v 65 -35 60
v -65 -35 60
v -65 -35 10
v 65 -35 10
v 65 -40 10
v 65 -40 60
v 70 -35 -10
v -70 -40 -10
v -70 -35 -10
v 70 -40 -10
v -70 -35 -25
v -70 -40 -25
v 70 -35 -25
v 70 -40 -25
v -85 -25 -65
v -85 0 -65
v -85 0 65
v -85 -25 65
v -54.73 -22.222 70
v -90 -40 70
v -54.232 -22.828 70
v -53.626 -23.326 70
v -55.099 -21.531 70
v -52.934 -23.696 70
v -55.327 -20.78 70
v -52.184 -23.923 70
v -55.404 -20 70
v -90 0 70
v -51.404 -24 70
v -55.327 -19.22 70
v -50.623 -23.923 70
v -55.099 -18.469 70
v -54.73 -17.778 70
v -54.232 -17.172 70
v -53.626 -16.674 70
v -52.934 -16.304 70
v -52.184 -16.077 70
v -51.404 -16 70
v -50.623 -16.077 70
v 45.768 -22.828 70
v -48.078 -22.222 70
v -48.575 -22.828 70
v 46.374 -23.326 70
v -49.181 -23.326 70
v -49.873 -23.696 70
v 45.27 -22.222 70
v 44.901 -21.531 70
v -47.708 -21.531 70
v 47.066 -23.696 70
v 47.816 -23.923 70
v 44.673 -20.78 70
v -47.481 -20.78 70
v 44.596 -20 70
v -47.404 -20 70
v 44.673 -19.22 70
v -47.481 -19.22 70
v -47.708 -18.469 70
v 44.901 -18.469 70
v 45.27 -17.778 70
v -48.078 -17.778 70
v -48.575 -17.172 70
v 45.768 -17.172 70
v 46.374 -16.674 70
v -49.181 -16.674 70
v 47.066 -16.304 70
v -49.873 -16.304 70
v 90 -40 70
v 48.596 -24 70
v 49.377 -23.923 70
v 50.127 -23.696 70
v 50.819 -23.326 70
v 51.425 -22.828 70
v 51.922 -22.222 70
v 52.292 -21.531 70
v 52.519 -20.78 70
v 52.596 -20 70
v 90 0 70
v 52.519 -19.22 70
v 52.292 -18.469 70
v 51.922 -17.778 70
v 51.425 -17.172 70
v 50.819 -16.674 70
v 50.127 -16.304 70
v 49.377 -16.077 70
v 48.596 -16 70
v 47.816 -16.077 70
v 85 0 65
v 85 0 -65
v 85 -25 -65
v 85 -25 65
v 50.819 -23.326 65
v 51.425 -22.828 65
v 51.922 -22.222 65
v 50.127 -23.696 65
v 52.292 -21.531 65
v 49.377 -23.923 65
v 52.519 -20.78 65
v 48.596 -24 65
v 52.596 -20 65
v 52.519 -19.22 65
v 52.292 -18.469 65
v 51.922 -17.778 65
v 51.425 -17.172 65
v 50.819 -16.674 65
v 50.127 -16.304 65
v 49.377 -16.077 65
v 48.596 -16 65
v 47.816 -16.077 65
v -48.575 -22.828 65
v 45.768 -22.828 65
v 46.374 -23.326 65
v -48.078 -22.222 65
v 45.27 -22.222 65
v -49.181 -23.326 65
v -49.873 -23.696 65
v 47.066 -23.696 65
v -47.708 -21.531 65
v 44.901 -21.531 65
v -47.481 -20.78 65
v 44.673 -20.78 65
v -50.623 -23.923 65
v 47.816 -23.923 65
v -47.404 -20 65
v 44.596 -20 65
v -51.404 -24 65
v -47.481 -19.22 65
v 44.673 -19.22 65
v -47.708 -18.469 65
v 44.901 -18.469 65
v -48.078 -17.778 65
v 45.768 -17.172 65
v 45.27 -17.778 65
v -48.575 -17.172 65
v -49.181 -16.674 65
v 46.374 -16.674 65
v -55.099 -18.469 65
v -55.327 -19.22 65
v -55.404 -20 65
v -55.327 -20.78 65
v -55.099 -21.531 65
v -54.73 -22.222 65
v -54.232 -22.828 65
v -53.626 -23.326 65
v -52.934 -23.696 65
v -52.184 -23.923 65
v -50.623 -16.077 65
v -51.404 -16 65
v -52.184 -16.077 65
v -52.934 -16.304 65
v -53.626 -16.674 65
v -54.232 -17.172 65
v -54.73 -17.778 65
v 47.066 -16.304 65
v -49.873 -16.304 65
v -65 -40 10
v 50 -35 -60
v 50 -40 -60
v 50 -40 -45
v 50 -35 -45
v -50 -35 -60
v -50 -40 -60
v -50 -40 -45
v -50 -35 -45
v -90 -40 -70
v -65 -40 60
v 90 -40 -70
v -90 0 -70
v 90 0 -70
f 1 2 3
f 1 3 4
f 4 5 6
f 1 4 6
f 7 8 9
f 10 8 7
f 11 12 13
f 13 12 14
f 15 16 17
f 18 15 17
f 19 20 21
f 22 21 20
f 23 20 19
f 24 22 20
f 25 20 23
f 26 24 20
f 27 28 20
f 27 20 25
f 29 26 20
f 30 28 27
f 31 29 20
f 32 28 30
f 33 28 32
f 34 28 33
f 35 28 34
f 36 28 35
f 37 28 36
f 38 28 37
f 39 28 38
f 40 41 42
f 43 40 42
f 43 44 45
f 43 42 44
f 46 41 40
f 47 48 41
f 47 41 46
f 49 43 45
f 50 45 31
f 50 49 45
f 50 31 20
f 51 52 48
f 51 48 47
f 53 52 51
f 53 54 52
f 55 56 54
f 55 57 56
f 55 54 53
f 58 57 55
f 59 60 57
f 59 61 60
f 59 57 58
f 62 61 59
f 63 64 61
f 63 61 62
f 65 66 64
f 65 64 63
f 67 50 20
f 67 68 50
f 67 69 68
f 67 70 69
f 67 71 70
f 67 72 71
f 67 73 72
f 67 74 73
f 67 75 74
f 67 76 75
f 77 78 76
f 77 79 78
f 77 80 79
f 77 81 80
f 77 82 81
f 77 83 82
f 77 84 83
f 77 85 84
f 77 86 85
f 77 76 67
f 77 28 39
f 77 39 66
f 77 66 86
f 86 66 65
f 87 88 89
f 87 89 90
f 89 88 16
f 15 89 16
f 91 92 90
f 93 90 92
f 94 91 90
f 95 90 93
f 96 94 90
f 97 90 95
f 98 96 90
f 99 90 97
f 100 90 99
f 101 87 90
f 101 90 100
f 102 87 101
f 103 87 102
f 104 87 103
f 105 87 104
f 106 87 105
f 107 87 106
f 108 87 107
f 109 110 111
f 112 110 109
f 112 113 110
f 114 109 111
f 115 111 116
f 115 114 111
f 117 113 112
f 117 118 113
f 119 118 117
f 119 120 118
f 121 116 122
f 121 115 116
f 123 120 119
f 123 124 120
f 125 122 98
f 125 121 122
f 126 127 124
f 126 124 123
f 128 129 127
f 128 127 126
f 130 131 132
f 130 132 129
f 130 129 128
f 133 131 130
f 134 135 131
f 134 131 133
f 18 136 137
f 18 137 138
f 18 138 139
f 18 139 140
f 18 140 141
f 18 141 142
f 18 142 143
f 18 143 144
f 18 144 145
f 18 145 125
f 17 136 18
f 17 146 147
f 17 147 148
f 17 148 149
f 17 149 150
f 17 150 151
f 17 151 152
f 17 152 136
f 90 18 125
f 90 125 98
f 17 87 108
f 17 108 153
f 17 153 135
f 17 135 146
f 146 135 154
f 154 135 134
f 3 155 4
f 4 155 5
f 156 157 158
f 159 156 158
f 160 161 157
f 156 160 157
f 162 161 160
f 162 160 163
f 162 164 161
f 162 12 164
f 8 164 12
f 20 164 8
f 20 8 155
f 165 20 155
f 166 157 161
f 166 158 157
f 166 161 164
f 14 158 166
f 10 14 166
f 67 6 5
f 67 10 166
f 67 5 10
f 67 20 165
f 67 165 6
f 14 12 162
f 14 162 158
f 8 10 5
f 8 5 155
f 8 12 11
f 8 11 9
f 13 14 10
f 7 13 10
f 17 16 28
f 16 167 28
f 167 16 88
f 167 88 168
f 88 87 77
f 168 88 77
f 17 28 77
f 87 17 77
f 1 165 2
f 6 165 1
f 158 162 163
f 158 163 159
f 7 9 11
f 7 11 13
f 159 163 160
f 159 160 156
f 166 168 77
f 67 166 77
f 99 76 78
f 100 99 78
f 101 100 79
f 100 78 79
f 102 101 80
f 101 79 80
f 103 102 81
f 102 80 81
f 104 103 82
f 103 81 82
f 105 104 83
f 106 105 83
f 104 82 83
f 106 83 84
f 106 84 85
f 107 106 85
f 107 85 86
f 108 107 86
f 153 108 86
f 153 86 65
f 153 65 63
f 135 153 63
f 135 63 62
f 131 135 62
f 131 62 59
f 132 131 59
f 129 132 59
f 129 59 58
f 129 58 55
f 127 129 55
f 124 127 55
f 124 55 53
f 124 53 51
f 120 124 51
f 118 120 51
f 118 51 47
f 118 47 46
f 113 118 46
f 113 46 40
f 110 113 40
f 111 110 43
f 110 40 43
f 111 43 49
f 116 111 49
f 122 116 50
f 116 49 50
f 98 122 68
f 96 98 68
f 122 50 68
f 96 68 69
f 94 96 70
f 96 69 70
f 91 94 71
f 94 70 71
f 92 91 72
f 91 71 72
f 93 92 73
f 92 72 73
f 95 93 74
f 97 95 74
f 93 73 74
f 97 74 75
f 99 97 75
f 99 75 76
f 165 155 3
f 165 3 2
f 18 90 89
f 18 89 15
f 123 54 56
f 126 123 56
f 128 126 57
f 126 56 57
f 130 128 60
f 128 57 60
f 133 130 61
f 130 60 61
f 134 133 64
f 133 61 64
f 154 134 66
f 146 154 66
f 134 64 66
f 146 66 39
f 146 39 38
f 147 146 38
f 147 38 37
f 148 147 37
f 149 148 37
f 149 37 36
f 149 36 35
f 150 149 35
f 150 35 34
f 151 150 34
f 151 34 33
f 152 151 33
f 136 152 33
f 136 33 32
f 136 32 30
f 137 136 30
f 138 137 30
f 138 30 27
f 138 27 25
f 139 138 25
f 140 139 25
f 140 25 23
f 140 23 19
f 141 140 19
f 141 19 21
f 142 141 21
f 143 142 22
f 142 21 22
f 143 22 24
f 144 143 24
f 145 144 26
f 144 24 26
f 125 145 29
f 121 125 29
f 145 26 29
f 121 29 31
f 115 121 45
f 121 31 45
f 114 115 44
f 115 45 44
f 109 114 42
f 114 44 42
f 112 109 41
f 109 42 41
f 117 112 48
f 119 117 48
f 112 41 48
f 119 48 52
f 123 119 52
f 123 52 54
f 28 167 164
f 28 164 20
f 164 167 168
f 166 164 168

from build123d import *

# Parameters (mm, degrees)
F0_W     = 180
F0_H     = 140
F1_DEPTH = 40
F2_W     = 130
F2_H     = 50
F2_W_2   = 140
F2_H_2   = 15
F2_W_3   = 100
F3_DEPTH = 5
F4_W     = 170
F4_H     = 130
F5_DEPTH = 25
F6_R     = 4
F7_DEPTH = 25


with BuildPart() as f1:
    # F0 (on Front) → F1 (new body)
    with BuildSketch(Plane.XZ):
        Rectangle(F0_W, F0_H)
    extrude(amount=F1_DEPTH)

    # F2 (on face) → F3 (cut)
    with BuildSketch(Plane.XZ.offset(40)):
        with Locations((0, 35)):
            Rectangle(F2_W, F2_H)
        with Locations((0, -17.5)):
            Rectangle(F2_W_2, F2_H_2)
        with Locations((0, -52.5)):
            Rectangle(F2_W_3, F2_H_2)
    extrude(amount=-F3_DEPTH, mode=Mode.SUBTRACT)

    # F4 (on face) → F5 (cut)
    with BuildSketch(Plane(origin=(0, 0, 0), x_dir=(-1, 0, 0), z_dir=(0, 1, 0))):
        Rectangle(F4_W, F4_H)
    extrude(amount=-F5_DEPTH, mode=Mode.SUBTRACT)

    # F6 (on face) → F7 (cut)
    with BuildSketch(Plane.XY.offset(70)):
        with Locations((48.596286, -20)):
            Circle(F6_R)
        with Locations((-51.403714, -20)):
            Circle(F6_R)
    extrude(amount=-F7_DEPTH, mode=Mode.SUBTRACT)


solid = f1.part
